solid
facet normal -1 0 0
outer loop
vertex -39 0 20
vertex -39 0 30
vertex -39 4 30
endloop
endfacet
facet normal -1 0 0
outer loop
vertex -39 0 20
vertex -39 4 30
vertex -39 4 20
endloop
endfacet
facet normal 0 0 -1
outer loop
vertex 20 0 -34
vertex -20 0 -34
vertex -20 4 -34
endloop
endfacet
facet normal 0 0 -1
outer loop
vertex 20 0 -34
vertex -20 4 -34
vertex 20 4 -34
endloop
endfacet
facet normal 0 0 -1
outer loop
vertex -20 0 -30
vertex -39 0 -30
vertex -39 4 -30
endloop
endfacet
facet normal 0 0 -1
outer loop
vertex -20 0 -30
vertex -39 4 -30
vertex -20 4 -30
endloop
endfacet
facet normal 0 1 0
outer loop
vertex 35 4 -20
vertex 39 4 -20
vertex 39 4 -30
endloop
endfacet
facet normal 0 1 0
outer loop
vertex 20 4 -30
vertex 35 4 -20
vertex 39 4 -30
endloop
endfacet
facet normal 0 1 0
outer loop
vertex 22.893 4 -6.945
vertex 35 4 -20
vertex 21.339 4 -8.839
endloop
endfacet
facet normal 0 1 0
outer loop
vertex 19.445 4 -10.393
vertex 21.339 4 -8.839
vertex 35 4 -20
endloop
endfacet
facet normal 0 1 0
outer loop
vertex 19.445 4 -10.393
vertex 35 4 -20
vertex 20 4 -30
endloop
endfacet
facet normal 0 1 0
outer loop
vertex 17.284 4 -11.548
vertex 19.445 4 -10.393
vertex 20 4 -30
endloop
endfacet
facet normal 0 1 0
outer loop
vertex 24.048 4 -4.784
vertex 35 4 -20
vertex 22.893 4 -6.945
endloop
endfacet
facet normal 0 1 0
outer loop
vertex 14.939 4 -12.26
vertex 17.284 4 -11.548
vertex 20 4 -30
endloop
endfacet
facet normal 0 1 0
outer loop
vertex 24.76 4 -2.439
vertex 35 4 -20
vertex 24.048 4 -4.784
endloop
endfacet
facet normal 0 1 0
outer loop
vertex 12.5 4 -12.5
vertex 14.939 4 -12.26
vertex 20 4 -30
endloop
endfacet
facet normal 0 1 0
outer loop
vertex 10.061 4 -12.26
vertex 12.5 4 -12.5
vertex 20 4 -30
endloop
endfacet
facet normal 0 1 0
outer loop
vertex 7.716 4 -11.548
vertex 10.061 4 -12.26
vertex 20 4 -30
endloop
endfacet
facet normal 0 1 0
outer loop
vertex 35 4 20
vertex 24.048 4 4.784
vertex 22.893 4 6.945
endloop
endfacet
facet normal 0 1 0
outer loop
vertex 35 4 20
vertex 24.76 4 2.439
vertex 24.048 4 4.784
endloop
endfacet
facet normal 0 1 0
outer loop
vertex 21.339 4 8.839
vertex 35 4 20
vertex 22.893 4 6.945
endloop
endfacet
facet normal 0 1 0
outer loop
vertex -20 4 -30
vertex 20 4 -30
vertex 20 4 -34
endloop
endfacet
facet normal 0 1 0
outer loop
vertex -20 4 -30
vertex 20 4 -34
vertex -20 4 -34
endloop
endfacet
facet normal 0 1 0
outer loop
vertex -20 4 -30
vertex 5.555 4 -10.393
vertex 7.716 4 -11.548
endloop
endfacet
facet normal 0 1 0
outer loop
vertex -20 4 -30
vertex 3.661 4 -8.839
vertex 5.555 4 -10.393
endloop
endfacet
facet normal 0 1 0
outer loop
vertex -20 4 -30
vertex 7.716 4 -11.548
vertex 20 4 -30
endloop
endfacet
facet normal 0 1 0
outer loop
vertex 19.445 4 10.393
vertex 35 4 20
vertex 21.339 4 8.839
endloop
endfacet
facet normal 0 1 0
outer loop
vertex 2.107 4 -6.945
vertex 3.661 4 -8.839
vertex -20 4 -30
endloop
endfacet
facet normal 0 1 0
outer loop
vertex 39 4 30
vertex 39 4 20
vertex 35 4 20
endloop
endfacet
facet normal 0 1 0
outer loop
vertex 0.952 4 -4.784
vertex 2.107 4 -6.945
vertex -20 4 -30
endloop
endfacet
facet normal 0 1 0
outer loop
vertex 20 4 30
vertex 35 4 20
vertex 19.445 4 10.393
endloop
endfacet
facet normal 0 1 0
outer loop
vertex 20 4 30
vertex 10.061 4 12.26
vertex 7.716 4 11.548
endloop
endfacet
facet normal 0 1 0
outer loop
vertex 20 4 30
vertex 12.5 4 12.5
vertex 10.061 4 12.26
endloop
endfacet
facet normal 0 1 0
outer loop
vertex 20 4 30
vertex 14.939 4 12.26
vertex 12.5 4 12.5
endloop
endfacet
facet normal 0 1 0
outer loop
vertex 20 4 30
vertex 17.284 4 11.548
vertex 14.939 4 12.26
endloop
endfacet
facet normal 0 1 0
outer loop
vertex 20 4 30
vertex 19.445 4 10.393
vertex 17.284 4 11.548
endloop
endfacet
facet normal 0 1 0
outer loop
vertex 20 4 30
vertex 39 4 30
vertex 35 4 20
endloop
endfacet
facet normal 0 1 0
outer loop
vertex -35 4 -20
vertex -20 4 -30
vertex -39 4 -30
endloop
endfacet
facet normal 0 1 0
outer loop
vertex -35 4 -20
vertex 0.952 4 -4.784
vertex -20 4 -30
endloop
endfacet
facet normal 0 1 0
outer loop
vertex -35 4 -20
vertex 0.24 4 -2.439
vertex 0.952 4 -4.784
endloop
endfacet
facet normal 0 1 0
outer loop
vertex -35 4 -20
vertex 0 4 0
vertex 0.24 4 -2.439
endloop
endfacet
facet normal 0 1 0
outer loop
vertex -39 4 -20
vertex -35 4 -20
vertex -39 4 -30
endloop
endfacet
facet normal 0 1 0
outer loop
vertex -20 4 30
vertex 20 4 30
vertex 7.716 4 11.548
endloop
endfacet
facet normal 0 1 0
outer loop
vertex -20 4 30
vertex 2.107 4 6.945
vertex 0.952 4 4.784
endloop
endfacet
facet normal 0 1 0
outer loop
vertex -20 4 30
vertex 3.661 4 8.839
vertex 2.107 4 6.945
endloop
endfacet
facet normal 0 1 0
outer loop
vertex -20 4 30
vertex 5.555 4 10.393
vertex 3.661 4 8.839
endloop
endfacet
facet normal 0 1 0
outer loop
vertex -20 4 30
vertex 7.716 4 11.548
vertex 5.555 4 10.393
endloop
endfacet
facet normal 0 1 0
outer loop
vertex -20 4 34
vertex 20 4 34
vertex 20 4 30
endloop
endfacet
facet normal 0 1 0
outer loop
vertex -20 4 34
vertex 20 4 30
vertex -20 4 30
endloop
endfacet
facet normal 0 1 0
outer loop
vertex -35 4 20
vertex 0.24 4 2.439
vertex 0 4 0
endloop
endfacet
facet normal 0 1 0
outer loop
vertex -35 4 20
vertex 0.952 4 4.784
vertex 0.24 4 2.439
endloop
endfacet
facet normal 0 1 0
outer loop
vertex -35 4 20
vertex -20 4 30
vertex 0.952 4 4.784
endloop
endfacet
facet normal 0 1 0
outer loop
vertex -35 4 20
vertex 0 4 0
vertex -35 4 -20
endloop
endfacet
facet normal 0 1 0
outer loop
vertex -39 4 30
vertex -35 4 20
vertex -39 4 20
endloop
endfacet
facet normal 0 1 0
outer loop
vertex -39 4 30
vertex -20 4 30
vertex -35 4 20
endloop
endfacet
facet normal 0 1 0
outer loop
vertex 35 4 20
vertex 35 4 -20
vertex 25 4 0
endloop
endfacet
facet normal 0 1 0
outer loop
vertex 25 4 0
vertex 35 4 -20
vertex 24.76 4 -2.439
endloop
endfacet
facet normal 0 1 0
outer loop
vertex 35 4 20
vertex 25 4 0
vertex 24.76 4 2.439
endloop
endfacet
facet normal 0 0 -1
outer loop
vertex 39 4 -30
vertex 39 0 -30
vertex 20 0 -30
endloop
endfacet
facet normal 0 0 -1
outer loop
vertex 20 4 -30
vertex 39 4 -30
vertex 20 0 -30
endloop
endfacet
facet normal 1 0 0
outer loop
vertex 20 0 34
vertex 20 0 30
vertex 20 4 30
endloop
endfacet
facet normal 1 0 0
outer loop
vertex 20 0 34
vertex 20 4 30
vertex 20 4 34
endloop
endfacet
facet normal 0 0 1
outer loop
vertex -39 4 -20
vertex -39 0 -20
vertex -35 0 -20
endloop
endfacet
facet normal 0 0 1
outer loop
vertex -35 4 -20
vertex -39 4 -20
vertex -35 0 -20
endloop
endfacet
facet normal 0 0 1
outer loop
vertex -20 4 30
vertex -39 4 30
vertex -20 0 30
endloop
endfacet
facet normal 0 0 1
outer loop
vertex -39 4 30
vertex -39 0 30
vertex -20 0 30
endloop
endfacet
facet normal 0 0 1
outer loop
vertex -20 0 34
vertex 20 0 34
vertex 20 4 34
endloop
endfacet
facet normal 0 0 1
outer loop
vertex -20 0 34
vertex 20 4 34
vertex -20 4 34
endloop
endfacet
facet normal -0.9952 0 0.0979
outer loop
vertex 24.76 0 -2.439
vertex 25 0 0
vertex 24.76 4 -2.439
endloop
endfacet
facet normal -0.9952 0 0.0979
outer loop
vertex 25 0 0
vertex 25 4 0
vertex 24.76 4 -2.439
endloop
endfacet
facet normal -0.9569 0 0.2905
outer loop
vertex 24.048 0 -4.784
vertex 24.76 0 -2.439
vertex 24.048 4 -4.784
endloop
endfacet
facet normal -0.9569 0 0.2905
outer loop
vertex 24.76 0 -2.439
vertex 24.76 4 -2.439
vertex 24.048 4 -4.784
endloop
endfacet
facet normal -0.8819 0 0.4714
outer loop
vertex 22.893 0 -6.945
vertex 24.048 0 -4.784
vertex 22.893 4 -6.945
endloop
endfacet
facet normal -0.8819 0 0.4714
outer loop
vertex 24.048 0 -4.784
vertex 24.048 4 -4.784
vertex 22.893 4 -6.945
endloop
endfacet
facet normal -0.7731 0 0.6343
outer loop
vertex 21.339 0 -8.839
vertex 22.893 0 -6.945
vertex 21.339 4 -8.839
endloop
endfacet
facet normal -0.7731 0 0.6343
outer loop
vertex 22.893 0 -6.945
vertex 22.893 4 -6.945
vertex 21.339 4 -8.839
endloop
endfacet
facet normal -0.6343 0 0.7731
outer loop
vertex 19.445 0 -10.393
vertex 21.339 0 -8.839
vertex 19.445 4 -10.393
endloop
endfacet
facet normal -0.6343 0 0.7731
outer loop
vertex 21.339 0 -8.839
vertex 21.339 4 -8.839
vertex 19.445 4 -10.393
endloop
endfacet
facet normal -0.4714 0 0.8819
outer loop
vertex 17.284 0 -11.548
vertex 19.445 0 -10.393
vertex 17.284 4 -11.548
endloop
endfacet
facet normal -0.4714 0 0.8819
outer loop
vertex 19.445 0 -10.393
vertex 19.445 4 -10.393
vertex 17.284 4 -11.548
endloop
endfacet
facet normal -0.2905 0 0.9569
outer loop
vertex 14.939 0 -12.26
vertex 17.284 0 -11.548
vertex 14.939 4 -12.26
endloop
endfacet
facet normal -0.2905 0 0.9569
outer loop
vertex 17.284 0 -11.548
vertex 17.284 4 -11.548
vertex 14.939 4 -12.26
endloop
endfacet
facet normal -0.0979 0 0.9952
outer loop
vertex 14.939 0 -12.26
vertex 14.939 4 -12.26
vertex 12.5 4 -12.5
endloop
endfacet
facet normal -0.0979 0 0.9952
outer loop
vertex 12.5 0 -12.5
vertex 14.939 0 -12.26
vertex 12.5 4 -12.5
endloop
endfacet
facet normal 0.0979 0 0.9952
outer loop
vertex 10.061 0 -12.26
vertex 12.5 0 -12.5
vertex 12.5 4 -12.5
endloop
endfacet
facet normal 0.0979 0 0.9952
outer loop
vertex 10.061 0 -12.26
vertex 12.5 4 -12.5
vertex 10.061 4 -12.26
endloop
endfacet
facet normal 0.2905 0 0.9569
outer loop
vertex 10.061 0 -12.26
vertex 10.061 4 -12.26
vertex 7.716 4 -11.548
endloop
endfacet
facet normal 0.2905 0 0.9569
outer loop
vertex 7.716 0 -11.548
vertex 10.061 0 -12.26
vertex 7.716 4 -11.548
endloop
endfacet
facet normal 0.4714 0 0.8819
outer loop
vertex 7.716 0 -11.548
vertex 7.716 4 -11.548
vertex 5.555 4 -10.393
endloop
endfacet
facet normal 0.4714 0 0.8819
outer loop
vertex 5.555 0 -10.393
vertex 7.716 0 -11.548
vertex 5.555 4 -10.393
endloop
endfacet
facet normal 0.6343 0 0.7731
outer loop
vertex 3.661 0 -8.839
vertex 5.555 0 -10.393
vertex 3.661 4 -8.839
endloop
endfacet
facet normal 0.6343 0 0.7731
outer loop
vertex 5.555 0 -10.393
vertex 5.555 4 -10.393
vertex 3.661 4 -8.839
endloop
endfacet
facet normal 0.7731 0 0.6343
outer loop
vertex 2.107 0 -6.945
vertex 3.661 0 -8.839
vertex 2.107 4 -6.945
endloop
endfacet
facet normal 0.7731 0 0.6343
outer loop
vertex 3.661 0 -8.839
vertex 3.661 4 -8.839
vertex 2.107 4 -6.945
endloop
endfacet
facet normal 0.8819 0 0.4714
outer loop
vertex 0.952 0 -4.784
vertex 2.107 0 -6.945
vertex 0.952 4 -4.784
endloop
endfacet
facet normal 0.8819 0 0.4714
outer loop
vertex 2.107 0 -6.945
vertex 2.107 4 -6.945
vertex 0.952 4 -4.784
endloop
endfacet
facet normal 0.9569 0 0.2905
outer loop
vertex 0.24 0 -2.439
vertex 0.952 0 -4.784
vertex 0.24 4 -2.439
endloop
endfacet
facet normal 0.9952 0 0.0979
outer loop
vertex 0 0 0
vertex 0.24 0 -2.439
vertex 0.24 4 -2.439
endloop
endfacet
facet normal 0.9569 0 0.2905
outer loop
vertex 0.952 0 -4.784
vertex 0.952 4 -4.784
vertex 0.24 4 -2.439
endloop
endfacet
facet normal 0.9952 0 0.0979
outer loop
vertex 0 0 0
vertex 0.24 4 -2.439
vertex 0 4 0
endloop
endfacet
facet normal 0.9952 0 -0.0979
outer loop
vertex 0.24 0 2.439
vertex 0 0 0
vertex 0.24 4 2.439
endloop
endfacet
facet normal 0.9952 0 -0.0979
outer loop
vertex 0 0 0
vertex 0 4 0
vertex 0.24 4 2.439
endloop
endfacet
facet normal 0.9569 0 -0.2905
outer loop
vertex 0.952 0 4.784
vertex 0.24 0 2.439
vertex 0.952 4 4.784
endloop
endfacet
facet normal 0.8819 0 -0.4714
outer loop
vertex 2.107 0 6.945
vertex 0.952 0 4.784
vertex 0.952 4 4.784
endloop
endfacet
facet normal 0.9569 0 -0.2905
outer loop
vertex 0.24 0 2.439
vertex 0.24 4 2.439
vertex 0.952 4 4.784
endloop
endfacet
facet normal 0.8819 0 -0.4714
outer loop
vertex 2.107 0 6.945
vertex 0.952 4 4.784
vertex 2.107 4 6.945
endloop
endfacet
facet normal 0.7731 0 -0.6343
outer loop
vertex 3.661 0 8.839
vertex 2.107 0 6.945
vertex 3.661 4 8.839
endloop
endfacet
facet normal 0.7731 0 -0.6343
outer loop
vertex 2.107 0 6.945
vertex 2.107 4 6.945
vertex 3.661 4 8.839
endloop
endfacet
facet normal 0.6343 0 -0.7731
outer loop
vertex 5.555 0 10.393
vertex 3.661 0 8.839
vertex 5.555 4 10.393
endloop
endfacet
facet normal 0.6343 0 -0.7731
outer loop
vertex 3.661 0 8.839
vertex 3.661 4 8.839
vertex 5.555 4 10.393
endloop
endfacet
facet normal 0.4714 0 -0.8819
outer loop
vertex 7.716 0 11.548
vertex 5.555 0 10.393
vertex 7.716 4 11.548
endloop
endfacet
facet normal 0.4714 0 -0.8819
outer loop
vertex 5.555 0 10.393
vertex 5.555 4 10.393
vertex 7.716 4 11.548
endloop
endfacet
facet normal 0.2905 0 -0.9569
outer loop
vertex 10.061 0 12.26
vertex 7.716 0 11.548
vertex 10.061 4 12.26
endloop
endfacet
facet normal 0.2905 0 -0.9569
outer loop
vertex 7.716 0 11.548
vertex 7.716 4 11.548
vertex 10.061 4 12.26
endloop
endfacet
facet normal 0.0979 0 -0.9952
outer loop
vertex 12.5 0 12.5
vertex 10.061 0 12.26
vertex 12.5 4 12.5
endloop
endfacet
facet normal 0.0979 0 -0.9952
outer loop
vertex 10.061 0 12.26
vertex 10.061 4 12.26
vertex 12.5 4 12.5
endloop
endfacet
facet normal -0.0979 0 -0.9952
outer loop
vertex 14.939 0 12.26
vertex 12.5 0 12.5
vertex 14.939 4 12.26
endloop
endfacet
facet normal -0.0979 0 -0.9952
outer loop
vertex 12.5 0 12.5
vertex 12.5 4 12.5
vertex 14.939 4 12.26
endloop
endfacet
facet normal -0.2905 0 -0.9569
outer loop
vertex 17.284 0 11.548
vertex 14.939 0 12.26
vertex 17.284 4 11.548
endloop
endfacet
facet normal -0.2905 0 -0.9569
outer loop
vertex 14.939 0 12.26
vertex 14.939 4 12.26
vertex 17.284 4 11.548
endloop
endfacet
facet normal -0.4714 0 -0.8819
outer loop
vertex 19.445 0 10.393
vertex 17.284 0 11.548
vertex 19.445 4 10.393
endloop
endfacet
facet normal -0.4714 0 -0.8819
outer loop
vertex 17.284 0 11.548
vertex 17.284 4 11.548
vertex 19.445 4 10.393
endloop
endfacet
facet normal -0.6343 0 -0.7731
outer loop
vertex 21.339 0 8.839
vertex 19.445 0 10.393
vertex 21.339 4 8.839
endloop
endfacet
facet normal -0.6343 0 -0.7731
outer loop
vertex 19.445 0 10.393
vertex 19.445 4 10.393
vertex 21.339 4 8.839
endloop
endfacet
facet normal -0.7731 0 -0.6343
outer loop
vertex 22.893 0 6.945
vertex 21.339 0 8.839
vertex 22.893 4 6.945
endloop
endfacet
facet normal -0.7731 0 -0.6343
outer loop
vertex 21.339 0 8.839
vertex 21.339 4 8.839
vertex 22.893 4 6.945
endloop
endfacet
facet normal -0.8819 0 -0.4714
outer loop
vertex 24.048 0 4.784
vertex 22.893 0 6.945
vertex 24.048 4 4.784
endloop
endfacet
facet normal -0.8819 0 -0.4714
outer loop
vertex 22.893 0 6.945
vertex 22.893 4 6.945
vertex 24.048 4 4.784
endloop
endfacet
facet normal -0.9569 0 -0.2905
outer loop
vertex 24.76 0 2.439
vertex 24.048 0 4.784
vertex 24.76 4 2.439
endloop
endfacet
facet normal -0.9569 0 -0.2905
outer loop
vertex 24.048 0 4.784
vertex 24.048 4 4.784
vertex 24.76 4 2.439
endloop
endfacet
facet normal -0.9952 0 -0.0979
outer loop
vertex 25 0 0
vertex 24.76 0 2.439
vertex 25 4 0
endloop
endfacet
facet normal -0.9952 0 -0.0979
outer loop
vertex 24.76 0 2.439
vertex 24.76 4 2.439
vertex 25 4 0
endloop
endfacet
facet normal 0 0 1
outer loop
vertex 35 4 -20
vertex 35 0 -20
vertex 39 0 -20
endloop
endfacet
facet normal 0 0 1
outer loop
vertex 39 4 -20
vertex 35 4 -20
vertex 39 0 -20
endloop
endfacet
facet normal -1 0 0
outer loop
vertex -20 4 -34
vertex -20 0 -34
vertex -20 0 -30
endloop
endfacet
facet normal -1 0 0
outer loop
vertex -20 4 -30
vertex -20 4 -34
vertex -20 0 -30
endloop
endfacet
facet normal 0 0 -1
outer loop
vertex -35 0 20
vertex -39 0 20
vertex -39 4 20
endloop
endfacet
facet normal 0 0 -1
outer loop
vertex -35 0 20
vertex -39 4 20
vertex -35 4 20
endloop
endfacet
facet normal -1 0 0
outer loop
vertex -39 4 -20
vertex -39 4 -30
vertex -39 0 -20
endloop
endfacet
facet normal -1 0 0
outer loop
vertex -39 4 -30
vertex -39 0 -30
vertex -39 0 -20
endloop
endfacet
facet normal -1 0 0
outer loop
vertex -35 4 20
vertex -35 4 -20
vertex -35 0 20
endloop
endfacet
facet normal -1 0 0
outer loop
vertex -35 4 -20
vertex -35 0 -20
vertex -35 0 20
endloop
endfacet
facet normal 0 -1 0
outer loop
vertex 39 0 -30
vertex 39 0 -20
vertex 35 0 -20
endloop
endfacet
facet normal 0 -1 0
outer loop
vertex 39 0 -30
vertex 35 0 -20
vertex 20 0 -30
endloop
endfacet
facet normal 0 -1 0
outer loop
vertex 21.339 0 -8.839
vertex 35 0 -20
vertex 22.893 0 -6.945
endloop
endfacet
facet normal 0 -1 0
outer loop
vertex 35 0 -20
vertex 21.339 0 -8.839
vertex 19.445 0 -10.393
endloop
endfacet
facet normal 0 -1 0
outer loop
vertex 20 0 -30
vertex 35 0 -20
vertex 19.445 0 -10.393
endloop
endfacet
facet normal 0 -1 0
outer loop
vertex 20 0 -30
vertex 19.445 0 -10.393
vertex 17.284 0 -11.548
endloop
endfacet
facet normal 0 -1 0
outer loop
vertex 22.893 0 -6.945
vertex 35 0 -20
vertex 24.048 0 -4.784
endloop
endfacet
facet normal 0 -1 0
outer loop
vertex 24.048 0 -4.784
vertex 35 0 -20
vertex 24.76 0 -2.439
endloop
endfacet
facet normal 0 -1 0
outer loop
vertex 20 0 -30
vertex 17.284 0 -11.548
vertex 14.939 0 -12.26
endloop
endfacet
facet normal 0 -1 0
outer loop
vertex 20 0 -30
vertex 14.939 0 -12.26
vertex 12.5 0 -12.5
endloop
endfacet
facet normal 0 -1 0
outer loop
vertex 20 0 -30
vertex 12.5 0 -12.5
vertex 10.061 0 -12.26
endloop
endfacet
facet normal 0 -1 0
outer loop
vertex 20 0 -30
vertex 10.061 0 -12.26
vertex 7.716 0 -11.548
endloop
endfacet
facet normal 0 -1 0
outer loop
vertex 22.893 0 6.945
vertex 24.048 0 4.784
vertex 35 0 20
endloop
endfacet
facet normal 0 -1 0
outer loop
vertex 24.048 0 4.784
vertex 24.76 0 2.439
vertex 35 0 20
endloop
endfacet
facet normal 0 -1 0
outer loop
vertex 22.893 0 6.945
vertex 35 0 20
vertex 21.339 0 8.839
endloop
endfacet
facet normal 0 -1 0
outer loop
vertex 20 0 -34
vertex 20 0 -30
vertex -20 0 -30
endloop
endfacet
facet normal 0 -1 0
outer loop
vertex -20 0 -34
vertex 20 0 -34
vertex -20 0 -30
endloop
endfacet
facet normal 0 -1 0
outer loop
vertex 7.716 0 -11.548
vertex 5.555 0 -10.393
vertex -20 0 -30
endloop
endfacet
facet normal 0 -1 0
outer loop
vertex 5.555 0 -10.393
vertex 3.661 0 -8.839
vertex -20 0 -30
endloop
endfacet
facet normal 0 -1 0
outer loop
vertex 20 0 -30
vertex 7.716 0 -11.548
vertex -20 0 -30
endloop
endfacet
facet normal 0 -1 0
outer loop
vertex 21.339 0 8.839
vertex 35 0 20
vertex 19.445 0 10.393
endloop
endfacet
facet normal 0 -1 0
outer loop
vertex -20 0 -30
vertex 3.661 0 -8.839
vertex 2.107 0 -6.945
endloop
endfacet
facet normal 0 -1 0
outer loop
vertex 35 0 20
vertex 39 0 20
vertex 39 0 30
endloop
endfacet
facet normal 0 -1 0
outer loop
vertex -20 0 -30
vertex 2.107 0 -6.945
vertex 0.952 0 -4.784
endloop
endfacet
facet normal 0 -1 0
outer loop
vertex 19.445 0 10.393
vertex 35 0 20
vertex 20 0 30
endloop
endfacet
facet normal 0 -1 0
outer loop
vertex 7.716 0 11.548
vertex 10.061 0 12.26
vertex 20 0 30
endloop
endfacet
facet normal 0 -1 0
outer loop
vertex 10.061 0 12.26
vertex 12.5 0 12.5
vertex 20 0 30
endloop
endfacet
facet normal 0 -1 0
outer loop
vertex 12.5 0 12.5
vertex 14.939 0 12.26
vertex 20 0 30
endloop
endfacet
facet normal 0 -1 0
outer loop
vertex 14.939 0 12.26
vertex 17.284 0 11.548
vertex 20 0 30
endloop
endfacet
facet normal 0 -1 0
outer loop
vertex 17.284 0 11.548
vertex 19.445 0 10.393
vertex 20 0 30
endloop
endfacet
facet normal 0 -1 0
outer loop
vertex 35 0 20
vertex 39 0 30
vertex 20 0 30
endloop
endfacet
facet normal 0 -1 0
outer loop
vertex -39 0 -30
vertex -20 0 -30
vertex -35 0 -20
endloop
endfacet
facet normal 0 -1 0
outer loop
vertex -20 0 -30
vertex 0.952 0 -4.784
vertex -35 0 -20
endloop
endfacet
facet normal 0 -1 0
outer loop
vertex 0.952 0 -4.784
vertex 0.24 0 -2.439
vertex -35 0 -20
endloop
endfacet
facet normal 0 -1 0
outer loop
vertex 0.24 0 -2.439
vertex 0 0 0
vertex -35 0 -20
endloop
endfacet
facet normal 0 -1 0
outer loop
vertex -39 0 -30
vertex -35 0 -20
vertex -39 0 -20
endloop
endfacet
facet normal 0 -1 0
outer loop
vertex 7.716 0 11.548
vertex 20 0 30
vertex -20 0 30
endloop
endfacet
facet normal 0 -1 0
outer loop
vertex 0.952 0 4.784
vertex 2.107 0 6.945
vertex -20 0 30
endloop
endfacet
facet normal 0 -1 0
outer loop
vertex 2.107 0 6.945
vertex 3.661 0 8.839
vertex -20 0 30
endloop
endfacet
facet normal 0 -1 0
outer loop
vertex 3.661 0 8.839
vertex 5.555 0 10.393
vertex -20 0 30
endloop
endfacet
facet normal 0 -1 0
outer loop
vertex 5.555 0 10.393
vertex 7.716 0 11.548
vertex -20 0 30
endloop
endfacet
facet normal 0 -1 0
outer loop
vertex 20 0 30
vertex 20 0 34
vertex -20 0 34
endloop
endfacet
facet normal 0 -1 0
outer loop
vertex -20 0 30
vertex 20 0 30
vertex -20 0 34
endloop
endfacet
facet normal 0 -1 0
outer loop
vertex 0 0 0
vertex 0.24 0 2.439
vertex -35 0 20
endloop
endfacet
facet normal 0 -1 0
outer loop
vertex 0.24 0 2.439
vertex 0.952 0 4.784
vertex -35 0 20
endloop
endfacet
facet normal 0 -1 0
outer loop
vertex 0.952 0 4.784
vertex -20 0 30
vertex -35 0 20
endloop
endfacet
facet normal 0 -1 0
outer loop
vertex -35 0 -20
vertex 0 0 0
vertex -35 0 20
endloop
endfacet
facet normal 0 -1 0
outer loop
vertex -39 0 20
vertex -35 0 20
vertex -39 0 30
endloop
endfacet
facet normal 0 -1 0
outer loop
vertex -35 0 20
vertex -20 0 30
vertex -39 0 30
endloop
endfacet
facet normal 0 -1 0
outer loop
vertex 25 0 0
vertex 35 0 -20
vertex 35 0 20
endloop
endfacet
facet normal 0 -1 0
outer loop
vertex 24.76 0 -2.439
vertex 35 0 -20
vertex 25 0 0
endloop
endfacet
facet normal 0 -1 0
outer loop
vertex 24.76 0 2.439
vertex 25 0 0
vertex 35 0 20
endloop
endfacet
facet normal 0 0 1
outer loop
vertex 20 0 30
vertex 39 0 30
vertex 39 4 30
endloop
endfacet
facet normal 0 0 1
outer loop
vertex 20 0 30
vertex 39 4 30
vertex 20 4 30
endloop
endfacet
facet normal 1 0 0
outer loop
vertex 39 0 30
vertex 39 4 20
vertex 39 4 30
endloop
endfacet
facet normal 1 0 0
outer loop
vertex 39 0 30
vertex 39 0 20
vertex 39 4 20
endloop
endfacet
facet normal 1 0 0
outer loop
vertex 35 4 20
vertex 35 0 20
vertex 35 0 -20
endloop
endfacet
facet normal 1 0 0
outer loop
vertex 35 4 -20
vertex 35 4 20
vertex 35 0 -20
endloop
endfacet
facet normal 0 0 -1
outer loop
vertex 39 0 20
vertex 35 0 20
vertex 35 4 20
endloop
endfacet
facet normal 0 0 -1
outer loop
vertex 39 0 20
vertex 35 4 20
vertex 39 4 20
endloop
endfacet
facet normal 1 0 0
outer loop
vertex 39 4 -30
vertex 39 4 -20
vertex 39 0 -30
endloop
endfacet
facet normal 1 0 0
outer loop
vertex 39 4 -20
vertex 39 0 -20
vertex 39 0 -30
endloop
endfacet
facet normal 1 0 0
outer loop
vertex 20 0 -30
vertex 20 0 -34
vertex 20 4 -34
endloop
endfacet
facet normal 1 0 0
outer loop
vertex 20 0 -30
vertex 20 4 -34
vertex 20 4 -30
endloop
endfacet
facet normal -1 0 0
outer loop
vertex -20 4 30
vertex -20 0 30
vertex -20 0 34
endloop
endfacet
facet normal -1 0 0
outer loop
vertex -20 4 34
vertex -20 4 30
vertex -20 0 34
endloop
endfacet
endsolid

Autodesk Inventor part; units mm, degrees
ref_plane "YZ Plane" through (0, 0, 0) normal (1, 0, 0) x (0, 1, 0)
ref_plane "XZ Plane" through (0, 0, 0) normal (0, 1, 0) x (-1, 0, 0)
ref_plane "XY Plane" through (0, 0, 0) normal (0, 0, 1) x (1, 0, 0)
sketch "Sketch1" plane through (0, 0, 0) normal (0, 1, 0) x (-1, 0, 0)
  line L0 (35, 30) -> (-35, 30) construction
  line L1 (-35, 30) -> (-35, -30) construction
  line L2 (-35, -30) -> (35, -30) construction
  line L3 (35, -30) -> (35, 30) construction
  line L4 (-35, -20) -> (-39, -20)
  line L5 (-39, -20) -> (-39, -30)
  line L6 (-39, -30) -> (-35, -30)
  line L7 (-35, -30) -> (-35, -20) construction
  line L8 (-35, 20) -> (-39, 20)
  line L9 (-39, 20) -> (-39, 30)
  line L10 (-39, 30) -> (-35, 30)
  line L11 (-35, 30) -> (-35, 20) construction
  line L12 (35, 30) -> (39, 30)
  line L13 (39, 30) -> (39, 20)
  line L14 (39, 20) -> (35, 20)
  line L15 (35, 20) -> (35, 30) construction
  line L16 (35, -30) -> (39, -30)
  line L17 (39, -30) -> (39, -20)
  line L18 (39, -20) -> (35, -20)
  line L19 (35, -20) -> (35, -30) construction
  line L20 (20, -30) -> (35, -30) construction
  line L21 (35, -30) -> (35, -34) construction
  line L22 (35, -34) -> (20, -34) construction
  line L23 (20, -34) -> (20, -30)
  line L24 (-20, -30) -> (-35, -30) construction
  line L25 (-35, -30) -> (-35, -34) construction
  line L26 (-35, -34) -> (-20, -34) construction
  line L27 (-20, -34) -> (-20, -30)
  line L28 (-35, 30) -> (-20, 30)
  line L29 (-20, 30) -> (-20, 34)
  line L30 (-20, 34) -> (-35, 34) construction
  line L31 (-35, 34) -> (-35, 30) construction
  line L32 (20, 34) -> (35, 34) construction
  line L33 (35, 34) -> (35, 30) construction
  line L34 (35, 30) -> (20, 30)
  line L35 (20, 30) -> (20, 34)
  line L36 (20, -30) -> (-20, -30) construction
  line L37 (-35, 20) -> (-35, -20)
  line L38 (35, -20) -> (35, 20)
  line L39 (20, 30) -> (-20, 30) construction
  line L40 (35, -30) -> (20, -30)
  line L41 (20, -34) -> (-20, -34)
  line L42 (-20, -30) -> (-35, -30)
  line L43 (-20, 34) -> (20, 34)
  line L44 (20, 30) -> (35, 30)
  point P0 (0, 0)
  point P1 (37, 20)
  point P2 (37, -20)
  point P3 (-20, -32)
  point P4 (20, -32)
  point P5 (0, -30)
  point P6 (35, 0)
  dimension "d0" = 70
  dimension "d1" = 60
  dimension "d2" = 4
  dimension "d3" = 40
  dimension "d4" = 40
extrude "Extrusion1" add sketch "Sketch1" along normal blind 4
sketch "Sketch2" plane through (0, 4, 0) normal (0, 1, 0) x (1, 0, 0)
  circle A0 centre (12.5, 0) radius 12.5
  line L0 (35, -20) -> (35, 20) projected
  point P0 (0, 0)
  dimension "d7" = 25
  dimension "d8" = 10
extrude "Extrusion2" cut sketch "Sketch2" against normal blind 4
properties part number "SideFemale_70wx60h" material "Wood (Oak)"
